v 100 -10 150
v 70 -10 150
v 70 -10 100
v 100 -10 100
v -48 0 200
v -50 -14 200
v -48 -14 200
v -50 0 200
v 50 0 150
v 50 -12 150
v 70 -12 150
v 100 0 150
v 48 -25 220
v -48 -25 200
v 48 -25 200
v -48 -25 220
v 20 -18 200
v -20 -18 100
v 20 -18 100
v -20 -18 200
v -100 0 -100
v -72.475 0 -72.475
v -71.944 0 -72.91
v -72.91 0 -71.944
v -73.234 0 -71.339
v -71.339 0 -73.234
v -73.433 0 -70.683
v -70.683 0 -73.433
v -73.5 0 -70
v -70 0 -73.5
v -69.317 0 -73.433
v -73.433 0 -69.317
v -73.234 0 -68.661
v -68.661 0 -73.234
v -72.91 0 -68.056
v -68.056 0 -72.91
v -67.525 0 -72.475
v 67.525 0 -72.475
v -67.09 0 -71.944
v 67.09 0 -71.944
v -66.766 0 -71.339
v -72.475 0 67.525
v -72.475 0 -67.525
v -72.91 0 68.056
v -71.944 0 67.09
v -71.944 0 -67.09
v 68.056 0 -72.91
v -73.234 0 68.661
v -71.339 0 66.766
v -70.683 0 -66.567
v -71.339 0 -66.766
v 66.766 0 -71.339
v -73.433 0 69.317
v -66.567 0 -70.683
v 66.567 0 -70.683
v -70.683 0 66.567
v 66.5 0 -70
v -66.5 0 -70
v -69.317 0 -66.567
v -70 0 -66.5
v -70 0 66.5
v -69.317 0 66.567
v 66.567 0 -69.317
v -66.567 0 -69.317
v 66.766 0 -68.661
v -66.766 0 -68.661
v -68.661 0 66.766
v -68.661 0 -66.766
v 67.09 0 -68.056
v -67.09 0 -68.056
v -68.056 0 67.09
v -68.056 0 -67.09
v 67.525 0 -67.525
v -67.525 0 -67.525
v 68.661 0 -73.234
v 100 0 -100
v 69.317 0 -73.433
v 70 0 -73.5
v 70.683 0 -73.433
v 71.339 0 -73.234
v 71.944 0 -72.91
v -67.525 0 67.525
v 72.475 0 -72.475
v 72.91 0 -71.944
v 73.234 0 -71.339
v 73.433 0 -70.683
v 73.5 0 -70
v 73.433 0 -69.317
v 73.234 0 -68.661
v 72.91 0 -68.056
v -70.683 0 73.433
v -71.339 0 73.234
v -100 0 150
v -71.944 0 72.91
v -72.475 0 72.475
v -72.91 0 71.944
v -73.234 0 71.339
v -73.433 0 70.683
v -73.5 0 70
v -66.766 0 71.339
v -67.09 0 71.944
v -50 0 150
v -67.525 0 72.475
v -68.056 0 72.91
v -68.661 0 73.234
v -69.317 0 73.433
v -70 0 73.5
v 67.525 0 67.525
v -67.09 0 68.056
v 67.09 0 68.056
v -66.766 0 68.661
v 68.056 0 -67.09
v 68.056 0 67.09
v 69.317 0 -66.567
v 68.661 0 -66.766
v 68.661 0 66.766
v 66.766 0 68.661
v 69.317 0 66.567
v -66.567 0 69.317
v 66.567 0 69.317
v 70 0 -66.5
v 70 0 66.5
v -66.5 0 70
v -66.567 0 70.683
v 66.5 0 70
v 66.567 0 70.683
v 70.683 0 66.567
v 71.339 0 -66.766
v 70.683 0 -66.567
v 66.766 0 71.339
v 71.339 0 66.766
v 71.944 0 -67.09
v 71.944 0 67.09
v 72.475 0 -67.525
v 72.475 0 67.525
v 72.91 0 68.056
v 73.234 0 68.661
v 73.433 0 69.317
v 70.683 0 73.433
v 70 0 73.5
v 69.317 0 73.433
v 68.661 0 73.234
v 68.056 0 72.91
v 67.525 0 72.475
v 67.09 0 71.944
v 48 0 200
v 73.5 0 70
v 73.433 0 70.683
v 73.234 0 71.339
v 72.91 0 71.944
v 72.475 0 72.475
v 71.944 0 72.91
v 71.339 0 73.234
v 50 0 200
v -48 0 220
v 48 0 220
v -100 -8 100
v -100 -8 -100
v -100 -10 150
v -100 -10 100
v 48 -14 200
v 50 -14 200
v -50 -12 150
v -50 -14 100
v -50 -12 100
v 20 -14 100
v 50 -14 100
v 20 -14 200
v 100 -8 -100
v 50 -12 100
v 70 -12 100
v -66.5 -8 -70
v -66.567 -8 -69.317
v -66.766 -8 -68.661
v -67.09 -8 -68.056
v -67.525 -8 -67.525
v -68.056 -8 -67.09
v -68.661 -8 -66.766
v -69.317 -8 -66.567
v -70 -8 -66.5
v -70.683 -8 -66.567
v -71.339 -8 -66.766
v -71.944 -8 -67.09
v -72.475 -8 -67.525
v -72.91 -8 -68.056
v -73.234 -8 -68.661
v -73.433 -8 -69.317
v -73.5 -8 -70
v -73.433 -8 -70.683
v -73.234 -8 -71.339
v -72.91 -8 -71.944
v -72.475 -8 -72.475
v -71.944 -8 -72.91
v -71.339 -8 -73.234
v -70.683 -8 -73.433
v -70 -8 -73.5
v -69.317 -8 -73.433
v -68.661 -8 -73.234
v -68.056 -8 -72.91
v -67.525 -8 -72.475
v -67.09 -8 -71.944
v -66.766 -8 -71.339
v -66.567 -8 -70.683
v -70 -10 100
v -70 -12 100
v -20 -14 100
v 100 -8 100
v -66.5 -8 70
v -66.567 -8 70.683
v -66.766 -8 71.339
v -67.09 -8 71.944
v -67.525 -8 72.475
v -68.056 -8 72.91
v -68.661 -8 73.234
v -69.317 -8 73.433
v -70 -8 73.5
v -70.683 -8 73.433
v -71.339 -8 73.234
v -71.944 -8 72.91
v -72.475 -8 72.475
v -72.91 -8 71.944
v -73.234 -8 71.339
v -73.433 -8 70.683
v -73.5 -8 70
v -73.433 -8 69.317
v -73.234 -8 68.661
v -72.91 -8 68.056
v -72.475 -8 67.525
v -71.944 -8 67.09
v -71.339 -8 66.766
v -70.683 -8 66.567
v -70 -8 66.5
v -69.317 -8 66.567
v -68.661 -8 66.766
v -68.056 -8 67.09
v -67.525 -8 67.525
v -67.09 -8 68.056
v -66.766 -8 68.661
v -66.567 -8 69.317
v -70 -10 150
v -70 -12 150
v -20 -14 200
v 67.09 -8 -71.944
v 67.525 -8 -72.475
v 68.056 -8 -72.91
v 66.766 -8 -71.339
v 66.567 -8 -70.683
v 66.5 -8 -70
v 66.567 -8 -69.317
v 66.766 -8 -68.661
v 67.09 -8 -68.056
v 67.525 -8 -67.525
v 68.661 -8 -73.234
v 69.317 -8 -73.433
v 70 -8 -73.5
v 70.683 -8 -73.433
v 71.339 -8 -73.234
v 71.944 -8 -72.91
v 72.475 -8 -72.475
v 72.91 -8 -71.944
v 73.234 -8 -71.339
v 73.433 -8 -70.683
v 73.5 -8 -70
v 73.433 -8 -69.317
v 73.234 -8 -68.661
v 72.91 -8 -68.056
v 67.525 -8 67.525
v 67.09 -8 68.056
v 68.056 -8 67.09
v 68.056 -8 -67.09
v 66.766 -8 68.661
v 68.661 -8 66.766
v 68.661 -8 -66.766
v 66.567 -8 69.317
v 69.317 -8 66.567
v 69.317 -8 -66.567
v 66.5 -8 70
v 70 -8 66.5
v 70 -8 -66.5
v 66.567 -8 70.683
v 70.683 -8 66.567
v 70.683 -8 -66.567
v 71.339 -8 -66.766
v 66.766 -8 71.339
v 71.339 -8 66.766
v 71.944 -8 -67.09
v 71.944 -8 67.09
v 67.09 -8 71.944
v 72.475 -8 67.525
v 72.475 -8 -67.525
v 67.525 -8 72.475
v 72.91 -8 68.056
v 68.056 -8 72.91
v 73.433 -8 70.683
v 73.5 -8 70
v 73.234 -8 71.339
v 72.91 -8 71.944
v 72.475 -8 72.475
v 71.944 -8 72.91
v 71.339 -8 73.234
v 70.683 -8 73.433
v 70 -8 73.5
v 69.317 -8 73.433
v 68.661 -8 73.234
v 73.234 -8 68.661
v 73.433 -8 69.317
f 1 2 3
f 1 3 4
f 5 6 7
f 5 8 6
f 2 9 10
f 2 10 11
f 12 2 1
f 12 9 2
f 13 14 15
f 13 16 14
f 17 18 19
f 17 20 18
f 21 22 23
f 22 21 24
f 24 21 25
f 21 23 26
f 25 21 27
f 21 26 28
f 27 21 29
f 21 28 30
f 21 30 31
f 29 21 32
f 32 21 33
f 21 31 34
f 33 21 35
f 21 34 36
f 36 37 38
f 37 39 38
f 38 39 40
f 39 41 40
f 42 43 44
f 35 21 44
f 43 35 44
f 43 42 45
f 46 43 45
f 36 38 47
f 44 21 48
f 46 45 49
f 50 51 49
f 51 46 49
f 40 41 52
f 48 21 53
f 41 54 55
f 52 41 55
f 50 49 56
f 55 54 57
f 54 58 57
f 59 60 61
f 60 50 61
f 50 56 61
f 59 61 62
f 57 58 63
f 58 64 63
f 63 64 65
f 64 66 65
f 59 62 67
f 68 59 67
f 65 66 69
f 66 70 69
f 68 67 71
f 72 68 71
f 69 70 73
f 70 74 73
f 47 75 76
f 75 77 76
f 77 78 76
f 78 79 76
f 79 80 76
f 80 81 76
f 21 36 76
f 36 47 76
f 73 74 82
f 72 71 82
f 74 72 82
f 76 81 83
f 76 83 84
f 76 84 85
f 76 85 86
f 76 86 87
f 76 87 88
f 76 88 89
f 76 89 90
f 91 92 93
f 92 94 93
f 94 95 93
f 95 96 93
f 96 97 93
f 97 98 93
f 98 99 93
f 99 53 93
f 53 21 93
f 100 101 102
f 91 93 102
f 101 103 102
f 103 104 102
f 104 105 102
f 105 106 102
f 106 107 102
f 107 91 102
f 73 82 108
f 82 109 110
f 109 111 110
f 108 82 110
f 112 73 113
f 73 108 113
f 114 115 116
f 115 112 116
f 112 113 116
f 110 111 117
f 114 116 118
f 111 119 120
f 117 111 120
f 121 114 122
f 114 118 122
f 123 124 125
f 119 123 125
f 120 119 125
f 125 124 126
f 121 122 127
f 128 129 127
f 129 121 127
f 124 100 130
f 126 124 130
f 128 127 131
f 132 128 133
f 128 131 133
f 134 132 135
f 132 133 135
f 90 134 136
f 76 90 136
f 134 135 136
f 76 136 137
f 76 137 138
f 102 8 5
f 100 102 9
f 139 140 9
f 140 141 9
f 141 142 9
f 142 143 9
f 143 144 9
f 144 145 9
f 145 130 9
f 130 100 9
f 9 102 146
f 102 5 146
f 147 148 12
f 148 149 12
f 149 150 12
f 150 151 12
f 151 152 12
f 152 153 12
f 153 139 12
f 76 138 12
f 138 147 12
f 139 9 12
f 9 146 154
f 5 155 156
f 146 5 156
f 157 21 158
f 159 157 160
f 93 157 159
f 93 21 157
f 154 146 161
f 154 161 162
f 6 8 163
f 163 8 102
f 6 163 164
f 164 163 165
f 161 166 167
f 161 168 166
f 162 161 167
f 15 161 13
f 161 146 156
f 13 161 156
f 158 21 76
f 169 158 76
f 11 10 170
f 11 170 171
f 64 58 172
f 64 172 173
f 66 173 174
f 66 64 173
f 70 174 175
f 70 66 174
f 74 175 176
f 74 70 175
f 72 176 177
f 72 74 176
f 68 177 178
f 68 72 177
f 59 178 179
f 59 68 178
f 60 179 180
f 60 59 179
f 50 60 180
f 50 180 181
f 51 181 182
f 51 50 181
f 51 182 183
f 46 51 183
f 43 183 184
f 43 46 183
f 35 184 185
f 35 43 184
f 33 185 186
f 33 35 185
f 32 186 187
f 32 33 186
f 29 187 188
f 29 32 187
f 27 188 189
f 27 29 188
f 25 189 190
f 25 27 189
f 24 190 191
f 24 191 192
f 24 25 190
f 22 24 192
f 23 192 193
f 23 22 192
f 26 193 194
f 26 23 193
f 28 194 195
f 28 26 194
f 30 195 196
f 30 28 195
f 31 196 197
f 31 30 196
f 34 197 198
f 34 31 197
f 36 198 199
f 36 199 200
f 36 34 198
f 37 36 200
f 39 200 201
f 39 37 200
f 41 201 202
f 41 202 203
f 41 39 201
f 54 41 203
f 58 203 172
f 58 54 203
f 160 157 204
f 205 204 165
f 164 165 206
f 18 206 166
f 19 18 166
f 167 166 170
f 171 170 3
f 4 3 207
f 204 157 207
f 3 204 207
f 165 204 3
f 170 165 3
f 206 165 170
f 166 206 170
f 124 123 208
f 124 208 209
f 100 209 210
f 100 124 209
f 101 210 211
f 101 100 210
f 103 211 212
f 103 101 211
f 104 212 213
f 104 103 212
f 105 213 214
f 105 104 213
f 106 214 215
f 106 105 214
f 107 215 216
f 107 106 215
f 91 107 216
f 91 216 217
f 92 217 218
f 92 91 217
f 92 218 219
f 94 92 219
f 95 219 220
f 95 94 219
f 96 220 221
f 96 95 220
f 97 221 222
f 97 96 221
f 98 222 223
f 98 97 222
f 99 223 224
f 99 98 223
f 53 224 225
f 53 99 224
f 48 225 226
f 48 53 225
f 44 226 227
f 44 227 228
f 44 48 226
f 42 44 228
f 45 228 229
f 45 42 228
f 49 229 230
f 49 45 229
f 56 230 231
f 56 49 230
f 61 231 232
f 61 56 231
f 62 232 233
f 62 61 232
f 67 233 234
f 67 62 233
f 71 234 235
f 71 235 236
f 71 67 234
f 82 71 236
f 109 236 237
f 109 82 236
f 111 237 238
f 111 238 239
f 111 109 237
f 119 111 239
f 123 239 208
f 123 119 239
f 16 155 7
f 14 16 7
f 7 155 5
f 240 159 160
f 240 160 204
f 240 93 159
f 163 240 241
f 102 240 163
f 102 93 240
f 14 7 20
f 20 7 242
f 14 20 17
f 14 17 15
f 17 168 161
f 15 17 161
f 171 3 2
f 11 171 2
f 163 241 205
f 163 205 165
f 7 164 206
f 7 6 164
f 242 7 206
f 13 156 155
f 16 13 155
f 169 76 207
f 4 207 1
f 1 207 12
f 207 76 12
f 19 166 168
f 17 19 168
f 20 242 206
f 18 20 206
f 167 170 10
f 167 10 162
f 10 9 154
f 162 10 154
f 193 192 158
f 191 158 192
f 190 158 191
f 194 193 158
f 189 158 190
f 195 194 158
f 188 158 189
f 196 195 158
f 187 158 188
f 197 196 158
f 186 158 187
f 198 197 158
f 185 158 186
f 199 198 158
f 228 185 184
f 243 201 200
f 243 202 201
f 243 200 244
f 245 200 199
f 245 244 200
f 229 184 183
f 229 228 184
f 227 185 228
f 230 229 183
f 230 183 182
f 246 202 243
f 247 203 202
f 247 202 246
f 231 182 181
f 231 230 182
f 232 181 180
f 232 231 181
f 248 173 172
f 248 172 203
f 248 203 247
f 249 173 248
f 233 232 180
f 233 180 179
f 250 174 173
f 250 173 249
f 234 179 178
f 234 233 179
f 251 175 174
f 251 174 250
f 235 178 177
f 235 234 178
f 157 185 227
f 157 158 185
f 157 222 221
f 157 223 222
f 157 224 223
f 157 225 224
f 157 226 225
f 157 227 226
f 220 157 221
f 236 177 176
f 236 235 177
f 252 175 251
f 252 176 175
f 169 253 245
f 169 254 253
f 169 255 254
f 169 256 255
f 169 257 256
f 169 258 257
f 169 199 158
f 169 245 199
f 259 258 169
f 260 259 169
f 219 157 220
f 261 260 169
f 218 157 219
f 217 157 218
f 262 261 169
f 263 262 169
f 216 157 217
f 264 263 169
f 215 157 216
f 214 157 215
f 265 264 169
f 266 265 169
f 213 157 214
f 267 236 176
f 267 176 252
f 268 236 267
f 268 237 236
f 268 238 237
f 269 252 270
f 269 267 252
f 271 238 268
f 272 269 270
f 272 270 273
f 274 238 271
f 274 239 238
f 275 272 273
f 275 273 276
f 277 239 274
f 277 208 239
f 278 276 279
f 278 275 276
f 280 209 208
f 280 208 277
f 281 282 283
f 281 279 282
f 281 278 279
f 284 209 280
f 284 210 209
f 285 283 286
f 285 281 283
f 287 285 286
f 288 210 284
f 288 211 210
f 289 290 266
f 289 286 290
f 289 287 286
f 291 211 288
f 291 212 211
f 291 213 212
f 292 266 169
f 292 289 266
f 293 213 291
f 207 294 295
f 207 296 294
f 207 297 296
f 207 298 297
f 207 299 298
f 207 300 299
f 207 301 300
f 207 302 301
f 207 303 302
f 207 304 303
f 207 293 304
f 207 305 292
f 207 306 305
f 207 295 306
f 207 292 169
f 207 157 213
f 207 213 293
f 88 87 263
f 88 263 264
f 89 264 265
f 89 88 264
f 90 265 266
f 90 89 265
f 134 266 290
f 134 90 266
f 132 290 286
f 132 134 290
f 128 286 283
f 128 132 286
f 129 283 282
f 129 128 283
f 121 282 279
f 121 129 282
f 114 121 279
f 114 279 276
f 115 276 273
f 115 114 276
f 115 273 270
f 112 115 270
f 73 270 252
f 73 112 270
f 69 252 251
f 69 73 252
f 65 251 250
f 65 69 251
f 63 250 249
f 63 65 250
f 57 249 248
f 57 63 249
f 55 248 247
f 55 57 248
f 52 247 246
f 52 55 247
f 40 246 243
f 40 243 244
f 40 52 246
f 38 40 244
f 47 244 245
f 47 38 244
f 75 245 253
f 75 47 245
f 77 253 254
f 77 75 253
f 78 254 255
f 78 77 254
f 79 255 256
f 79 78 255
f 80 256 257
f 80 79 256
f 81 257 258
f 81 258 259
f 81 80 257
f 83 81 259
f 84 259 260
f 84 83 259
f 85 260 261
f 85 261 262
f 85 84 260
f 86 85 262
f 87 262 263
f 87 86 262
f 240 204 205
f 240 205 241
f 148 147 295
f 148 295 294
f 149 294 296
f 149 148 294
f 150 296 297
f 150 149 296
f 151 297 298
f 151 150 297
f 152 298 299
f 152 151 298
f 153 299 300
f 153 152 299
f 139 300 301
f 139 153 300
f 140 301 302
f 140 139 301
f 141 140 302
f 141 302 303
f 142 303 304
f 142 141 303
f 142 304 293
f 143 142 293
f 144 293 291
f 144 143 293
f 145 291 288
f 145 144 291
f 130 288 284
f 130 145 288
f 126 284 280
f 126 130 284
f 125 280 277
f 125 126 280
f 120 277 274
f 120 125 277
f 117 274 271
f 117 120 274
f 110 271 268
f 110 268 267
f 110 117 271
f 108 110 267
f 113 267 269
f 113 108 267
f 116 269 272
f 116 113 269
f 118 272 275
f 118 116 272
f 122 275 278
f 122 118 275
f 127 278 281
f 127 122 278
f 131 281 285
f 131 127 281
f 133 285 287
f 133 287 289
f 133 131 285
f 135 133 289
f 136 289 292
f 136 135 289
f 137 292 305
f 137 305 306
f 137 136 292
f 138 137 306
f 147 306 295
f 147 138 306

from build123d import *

# Parameters (mm, degrees)
F0_R     = 3.5
F1_DEPTH = 8
F0_W     = 30
F0_H     = 50
F2_DEPTH = 10
F0_W_2   = 20
F3_DEPTH = 12
F4_DEPTH = 14
F0_W_3   = 40
F5_DEPTH = 18
F6_DEPTH = 25


with BuildPart() as f1:
    # F0 (on Front) → F1 (new body)
    with BuildSketch(Plane.XZ):
        Polygon((-70, 100), (-100, 100), (-100, -100), (100, -100), (100, 100), (70, 100), (50, 100), (20, 100), (-20, 100), (-50, 100), align=None)
        with Locations((-70, -70)):
            Circle(F0_R, mode=Mode.SUBTRACT)
        with Locations((70, -70)):
            Circle(F0_R, mode=Mode.SUBTRACT)
        with Locations((-70, 70)):
            Circle(F0_R, mode=Mode.SUBTRACT)
        with Locations((70, 70)):
            Circle(F0_R, mode=Mode.SUBTRACT)
    extrude(amount=F1_DEPTH)

    # F0 (on Front) → F2 (join)
    with BuildSketch(Plane.XZ):
        with Locations((-85, 125)):
            Rectangle(F0_W, F0_H)
        with Locations((85, 125)):
            Rectangle(F0_W, F0_H)
    extrude(amount=F2_DEPTH)

    # F0 (on Front) → F3 (join)
    with BuildSketch(Plane.XZ):
        with Locations((-60, 125)):
            Rectangle(F0_W_2, F0_H)
        with Locations((60, 125)):
            Rectangle(F0_W_2, F0_H)
    extrude(amount=F3_DEPTH)

    # F0 (on Front) → F4 (join)
    with BuildSketch(Plane.XZ):
        with Locations((-35, 125)):
            Rectangle(F0_W, F0_H)
        with Locations((35, 125)):
            Rectangle(F0_W, F0_H)
        Polygon((-50, 200), (-50, 150), (-20, 150), (-20, 200), (-48, 200), align=None)
        Polygon((20, 200), (20, 150), (50, 150), (50, 200), (48, 200), align=None)
    extrude(amount=F4_DEPTH)

    # F0 (on Front) → F5 (join)
    with BuildSketch(Plane.XZ):
        with Locations((0, 125)):
            Rectangle(F0_W_3, F0_H)
        with Locations((0, 175)):
            Rectangle(F0_W_3, F0_H)
    extrude(amount=F5_DEPTH)

    # F0 (on Front) → F6 (join)
    with BuildSketch(Plane.XZ):
        Polygon((-48, 200), (-20, 200), (20, 200), (48, 200), (48, 220), (-48, 220), align=None)
    extrude(amount=F6_DEPTH)


solid = f1.part
